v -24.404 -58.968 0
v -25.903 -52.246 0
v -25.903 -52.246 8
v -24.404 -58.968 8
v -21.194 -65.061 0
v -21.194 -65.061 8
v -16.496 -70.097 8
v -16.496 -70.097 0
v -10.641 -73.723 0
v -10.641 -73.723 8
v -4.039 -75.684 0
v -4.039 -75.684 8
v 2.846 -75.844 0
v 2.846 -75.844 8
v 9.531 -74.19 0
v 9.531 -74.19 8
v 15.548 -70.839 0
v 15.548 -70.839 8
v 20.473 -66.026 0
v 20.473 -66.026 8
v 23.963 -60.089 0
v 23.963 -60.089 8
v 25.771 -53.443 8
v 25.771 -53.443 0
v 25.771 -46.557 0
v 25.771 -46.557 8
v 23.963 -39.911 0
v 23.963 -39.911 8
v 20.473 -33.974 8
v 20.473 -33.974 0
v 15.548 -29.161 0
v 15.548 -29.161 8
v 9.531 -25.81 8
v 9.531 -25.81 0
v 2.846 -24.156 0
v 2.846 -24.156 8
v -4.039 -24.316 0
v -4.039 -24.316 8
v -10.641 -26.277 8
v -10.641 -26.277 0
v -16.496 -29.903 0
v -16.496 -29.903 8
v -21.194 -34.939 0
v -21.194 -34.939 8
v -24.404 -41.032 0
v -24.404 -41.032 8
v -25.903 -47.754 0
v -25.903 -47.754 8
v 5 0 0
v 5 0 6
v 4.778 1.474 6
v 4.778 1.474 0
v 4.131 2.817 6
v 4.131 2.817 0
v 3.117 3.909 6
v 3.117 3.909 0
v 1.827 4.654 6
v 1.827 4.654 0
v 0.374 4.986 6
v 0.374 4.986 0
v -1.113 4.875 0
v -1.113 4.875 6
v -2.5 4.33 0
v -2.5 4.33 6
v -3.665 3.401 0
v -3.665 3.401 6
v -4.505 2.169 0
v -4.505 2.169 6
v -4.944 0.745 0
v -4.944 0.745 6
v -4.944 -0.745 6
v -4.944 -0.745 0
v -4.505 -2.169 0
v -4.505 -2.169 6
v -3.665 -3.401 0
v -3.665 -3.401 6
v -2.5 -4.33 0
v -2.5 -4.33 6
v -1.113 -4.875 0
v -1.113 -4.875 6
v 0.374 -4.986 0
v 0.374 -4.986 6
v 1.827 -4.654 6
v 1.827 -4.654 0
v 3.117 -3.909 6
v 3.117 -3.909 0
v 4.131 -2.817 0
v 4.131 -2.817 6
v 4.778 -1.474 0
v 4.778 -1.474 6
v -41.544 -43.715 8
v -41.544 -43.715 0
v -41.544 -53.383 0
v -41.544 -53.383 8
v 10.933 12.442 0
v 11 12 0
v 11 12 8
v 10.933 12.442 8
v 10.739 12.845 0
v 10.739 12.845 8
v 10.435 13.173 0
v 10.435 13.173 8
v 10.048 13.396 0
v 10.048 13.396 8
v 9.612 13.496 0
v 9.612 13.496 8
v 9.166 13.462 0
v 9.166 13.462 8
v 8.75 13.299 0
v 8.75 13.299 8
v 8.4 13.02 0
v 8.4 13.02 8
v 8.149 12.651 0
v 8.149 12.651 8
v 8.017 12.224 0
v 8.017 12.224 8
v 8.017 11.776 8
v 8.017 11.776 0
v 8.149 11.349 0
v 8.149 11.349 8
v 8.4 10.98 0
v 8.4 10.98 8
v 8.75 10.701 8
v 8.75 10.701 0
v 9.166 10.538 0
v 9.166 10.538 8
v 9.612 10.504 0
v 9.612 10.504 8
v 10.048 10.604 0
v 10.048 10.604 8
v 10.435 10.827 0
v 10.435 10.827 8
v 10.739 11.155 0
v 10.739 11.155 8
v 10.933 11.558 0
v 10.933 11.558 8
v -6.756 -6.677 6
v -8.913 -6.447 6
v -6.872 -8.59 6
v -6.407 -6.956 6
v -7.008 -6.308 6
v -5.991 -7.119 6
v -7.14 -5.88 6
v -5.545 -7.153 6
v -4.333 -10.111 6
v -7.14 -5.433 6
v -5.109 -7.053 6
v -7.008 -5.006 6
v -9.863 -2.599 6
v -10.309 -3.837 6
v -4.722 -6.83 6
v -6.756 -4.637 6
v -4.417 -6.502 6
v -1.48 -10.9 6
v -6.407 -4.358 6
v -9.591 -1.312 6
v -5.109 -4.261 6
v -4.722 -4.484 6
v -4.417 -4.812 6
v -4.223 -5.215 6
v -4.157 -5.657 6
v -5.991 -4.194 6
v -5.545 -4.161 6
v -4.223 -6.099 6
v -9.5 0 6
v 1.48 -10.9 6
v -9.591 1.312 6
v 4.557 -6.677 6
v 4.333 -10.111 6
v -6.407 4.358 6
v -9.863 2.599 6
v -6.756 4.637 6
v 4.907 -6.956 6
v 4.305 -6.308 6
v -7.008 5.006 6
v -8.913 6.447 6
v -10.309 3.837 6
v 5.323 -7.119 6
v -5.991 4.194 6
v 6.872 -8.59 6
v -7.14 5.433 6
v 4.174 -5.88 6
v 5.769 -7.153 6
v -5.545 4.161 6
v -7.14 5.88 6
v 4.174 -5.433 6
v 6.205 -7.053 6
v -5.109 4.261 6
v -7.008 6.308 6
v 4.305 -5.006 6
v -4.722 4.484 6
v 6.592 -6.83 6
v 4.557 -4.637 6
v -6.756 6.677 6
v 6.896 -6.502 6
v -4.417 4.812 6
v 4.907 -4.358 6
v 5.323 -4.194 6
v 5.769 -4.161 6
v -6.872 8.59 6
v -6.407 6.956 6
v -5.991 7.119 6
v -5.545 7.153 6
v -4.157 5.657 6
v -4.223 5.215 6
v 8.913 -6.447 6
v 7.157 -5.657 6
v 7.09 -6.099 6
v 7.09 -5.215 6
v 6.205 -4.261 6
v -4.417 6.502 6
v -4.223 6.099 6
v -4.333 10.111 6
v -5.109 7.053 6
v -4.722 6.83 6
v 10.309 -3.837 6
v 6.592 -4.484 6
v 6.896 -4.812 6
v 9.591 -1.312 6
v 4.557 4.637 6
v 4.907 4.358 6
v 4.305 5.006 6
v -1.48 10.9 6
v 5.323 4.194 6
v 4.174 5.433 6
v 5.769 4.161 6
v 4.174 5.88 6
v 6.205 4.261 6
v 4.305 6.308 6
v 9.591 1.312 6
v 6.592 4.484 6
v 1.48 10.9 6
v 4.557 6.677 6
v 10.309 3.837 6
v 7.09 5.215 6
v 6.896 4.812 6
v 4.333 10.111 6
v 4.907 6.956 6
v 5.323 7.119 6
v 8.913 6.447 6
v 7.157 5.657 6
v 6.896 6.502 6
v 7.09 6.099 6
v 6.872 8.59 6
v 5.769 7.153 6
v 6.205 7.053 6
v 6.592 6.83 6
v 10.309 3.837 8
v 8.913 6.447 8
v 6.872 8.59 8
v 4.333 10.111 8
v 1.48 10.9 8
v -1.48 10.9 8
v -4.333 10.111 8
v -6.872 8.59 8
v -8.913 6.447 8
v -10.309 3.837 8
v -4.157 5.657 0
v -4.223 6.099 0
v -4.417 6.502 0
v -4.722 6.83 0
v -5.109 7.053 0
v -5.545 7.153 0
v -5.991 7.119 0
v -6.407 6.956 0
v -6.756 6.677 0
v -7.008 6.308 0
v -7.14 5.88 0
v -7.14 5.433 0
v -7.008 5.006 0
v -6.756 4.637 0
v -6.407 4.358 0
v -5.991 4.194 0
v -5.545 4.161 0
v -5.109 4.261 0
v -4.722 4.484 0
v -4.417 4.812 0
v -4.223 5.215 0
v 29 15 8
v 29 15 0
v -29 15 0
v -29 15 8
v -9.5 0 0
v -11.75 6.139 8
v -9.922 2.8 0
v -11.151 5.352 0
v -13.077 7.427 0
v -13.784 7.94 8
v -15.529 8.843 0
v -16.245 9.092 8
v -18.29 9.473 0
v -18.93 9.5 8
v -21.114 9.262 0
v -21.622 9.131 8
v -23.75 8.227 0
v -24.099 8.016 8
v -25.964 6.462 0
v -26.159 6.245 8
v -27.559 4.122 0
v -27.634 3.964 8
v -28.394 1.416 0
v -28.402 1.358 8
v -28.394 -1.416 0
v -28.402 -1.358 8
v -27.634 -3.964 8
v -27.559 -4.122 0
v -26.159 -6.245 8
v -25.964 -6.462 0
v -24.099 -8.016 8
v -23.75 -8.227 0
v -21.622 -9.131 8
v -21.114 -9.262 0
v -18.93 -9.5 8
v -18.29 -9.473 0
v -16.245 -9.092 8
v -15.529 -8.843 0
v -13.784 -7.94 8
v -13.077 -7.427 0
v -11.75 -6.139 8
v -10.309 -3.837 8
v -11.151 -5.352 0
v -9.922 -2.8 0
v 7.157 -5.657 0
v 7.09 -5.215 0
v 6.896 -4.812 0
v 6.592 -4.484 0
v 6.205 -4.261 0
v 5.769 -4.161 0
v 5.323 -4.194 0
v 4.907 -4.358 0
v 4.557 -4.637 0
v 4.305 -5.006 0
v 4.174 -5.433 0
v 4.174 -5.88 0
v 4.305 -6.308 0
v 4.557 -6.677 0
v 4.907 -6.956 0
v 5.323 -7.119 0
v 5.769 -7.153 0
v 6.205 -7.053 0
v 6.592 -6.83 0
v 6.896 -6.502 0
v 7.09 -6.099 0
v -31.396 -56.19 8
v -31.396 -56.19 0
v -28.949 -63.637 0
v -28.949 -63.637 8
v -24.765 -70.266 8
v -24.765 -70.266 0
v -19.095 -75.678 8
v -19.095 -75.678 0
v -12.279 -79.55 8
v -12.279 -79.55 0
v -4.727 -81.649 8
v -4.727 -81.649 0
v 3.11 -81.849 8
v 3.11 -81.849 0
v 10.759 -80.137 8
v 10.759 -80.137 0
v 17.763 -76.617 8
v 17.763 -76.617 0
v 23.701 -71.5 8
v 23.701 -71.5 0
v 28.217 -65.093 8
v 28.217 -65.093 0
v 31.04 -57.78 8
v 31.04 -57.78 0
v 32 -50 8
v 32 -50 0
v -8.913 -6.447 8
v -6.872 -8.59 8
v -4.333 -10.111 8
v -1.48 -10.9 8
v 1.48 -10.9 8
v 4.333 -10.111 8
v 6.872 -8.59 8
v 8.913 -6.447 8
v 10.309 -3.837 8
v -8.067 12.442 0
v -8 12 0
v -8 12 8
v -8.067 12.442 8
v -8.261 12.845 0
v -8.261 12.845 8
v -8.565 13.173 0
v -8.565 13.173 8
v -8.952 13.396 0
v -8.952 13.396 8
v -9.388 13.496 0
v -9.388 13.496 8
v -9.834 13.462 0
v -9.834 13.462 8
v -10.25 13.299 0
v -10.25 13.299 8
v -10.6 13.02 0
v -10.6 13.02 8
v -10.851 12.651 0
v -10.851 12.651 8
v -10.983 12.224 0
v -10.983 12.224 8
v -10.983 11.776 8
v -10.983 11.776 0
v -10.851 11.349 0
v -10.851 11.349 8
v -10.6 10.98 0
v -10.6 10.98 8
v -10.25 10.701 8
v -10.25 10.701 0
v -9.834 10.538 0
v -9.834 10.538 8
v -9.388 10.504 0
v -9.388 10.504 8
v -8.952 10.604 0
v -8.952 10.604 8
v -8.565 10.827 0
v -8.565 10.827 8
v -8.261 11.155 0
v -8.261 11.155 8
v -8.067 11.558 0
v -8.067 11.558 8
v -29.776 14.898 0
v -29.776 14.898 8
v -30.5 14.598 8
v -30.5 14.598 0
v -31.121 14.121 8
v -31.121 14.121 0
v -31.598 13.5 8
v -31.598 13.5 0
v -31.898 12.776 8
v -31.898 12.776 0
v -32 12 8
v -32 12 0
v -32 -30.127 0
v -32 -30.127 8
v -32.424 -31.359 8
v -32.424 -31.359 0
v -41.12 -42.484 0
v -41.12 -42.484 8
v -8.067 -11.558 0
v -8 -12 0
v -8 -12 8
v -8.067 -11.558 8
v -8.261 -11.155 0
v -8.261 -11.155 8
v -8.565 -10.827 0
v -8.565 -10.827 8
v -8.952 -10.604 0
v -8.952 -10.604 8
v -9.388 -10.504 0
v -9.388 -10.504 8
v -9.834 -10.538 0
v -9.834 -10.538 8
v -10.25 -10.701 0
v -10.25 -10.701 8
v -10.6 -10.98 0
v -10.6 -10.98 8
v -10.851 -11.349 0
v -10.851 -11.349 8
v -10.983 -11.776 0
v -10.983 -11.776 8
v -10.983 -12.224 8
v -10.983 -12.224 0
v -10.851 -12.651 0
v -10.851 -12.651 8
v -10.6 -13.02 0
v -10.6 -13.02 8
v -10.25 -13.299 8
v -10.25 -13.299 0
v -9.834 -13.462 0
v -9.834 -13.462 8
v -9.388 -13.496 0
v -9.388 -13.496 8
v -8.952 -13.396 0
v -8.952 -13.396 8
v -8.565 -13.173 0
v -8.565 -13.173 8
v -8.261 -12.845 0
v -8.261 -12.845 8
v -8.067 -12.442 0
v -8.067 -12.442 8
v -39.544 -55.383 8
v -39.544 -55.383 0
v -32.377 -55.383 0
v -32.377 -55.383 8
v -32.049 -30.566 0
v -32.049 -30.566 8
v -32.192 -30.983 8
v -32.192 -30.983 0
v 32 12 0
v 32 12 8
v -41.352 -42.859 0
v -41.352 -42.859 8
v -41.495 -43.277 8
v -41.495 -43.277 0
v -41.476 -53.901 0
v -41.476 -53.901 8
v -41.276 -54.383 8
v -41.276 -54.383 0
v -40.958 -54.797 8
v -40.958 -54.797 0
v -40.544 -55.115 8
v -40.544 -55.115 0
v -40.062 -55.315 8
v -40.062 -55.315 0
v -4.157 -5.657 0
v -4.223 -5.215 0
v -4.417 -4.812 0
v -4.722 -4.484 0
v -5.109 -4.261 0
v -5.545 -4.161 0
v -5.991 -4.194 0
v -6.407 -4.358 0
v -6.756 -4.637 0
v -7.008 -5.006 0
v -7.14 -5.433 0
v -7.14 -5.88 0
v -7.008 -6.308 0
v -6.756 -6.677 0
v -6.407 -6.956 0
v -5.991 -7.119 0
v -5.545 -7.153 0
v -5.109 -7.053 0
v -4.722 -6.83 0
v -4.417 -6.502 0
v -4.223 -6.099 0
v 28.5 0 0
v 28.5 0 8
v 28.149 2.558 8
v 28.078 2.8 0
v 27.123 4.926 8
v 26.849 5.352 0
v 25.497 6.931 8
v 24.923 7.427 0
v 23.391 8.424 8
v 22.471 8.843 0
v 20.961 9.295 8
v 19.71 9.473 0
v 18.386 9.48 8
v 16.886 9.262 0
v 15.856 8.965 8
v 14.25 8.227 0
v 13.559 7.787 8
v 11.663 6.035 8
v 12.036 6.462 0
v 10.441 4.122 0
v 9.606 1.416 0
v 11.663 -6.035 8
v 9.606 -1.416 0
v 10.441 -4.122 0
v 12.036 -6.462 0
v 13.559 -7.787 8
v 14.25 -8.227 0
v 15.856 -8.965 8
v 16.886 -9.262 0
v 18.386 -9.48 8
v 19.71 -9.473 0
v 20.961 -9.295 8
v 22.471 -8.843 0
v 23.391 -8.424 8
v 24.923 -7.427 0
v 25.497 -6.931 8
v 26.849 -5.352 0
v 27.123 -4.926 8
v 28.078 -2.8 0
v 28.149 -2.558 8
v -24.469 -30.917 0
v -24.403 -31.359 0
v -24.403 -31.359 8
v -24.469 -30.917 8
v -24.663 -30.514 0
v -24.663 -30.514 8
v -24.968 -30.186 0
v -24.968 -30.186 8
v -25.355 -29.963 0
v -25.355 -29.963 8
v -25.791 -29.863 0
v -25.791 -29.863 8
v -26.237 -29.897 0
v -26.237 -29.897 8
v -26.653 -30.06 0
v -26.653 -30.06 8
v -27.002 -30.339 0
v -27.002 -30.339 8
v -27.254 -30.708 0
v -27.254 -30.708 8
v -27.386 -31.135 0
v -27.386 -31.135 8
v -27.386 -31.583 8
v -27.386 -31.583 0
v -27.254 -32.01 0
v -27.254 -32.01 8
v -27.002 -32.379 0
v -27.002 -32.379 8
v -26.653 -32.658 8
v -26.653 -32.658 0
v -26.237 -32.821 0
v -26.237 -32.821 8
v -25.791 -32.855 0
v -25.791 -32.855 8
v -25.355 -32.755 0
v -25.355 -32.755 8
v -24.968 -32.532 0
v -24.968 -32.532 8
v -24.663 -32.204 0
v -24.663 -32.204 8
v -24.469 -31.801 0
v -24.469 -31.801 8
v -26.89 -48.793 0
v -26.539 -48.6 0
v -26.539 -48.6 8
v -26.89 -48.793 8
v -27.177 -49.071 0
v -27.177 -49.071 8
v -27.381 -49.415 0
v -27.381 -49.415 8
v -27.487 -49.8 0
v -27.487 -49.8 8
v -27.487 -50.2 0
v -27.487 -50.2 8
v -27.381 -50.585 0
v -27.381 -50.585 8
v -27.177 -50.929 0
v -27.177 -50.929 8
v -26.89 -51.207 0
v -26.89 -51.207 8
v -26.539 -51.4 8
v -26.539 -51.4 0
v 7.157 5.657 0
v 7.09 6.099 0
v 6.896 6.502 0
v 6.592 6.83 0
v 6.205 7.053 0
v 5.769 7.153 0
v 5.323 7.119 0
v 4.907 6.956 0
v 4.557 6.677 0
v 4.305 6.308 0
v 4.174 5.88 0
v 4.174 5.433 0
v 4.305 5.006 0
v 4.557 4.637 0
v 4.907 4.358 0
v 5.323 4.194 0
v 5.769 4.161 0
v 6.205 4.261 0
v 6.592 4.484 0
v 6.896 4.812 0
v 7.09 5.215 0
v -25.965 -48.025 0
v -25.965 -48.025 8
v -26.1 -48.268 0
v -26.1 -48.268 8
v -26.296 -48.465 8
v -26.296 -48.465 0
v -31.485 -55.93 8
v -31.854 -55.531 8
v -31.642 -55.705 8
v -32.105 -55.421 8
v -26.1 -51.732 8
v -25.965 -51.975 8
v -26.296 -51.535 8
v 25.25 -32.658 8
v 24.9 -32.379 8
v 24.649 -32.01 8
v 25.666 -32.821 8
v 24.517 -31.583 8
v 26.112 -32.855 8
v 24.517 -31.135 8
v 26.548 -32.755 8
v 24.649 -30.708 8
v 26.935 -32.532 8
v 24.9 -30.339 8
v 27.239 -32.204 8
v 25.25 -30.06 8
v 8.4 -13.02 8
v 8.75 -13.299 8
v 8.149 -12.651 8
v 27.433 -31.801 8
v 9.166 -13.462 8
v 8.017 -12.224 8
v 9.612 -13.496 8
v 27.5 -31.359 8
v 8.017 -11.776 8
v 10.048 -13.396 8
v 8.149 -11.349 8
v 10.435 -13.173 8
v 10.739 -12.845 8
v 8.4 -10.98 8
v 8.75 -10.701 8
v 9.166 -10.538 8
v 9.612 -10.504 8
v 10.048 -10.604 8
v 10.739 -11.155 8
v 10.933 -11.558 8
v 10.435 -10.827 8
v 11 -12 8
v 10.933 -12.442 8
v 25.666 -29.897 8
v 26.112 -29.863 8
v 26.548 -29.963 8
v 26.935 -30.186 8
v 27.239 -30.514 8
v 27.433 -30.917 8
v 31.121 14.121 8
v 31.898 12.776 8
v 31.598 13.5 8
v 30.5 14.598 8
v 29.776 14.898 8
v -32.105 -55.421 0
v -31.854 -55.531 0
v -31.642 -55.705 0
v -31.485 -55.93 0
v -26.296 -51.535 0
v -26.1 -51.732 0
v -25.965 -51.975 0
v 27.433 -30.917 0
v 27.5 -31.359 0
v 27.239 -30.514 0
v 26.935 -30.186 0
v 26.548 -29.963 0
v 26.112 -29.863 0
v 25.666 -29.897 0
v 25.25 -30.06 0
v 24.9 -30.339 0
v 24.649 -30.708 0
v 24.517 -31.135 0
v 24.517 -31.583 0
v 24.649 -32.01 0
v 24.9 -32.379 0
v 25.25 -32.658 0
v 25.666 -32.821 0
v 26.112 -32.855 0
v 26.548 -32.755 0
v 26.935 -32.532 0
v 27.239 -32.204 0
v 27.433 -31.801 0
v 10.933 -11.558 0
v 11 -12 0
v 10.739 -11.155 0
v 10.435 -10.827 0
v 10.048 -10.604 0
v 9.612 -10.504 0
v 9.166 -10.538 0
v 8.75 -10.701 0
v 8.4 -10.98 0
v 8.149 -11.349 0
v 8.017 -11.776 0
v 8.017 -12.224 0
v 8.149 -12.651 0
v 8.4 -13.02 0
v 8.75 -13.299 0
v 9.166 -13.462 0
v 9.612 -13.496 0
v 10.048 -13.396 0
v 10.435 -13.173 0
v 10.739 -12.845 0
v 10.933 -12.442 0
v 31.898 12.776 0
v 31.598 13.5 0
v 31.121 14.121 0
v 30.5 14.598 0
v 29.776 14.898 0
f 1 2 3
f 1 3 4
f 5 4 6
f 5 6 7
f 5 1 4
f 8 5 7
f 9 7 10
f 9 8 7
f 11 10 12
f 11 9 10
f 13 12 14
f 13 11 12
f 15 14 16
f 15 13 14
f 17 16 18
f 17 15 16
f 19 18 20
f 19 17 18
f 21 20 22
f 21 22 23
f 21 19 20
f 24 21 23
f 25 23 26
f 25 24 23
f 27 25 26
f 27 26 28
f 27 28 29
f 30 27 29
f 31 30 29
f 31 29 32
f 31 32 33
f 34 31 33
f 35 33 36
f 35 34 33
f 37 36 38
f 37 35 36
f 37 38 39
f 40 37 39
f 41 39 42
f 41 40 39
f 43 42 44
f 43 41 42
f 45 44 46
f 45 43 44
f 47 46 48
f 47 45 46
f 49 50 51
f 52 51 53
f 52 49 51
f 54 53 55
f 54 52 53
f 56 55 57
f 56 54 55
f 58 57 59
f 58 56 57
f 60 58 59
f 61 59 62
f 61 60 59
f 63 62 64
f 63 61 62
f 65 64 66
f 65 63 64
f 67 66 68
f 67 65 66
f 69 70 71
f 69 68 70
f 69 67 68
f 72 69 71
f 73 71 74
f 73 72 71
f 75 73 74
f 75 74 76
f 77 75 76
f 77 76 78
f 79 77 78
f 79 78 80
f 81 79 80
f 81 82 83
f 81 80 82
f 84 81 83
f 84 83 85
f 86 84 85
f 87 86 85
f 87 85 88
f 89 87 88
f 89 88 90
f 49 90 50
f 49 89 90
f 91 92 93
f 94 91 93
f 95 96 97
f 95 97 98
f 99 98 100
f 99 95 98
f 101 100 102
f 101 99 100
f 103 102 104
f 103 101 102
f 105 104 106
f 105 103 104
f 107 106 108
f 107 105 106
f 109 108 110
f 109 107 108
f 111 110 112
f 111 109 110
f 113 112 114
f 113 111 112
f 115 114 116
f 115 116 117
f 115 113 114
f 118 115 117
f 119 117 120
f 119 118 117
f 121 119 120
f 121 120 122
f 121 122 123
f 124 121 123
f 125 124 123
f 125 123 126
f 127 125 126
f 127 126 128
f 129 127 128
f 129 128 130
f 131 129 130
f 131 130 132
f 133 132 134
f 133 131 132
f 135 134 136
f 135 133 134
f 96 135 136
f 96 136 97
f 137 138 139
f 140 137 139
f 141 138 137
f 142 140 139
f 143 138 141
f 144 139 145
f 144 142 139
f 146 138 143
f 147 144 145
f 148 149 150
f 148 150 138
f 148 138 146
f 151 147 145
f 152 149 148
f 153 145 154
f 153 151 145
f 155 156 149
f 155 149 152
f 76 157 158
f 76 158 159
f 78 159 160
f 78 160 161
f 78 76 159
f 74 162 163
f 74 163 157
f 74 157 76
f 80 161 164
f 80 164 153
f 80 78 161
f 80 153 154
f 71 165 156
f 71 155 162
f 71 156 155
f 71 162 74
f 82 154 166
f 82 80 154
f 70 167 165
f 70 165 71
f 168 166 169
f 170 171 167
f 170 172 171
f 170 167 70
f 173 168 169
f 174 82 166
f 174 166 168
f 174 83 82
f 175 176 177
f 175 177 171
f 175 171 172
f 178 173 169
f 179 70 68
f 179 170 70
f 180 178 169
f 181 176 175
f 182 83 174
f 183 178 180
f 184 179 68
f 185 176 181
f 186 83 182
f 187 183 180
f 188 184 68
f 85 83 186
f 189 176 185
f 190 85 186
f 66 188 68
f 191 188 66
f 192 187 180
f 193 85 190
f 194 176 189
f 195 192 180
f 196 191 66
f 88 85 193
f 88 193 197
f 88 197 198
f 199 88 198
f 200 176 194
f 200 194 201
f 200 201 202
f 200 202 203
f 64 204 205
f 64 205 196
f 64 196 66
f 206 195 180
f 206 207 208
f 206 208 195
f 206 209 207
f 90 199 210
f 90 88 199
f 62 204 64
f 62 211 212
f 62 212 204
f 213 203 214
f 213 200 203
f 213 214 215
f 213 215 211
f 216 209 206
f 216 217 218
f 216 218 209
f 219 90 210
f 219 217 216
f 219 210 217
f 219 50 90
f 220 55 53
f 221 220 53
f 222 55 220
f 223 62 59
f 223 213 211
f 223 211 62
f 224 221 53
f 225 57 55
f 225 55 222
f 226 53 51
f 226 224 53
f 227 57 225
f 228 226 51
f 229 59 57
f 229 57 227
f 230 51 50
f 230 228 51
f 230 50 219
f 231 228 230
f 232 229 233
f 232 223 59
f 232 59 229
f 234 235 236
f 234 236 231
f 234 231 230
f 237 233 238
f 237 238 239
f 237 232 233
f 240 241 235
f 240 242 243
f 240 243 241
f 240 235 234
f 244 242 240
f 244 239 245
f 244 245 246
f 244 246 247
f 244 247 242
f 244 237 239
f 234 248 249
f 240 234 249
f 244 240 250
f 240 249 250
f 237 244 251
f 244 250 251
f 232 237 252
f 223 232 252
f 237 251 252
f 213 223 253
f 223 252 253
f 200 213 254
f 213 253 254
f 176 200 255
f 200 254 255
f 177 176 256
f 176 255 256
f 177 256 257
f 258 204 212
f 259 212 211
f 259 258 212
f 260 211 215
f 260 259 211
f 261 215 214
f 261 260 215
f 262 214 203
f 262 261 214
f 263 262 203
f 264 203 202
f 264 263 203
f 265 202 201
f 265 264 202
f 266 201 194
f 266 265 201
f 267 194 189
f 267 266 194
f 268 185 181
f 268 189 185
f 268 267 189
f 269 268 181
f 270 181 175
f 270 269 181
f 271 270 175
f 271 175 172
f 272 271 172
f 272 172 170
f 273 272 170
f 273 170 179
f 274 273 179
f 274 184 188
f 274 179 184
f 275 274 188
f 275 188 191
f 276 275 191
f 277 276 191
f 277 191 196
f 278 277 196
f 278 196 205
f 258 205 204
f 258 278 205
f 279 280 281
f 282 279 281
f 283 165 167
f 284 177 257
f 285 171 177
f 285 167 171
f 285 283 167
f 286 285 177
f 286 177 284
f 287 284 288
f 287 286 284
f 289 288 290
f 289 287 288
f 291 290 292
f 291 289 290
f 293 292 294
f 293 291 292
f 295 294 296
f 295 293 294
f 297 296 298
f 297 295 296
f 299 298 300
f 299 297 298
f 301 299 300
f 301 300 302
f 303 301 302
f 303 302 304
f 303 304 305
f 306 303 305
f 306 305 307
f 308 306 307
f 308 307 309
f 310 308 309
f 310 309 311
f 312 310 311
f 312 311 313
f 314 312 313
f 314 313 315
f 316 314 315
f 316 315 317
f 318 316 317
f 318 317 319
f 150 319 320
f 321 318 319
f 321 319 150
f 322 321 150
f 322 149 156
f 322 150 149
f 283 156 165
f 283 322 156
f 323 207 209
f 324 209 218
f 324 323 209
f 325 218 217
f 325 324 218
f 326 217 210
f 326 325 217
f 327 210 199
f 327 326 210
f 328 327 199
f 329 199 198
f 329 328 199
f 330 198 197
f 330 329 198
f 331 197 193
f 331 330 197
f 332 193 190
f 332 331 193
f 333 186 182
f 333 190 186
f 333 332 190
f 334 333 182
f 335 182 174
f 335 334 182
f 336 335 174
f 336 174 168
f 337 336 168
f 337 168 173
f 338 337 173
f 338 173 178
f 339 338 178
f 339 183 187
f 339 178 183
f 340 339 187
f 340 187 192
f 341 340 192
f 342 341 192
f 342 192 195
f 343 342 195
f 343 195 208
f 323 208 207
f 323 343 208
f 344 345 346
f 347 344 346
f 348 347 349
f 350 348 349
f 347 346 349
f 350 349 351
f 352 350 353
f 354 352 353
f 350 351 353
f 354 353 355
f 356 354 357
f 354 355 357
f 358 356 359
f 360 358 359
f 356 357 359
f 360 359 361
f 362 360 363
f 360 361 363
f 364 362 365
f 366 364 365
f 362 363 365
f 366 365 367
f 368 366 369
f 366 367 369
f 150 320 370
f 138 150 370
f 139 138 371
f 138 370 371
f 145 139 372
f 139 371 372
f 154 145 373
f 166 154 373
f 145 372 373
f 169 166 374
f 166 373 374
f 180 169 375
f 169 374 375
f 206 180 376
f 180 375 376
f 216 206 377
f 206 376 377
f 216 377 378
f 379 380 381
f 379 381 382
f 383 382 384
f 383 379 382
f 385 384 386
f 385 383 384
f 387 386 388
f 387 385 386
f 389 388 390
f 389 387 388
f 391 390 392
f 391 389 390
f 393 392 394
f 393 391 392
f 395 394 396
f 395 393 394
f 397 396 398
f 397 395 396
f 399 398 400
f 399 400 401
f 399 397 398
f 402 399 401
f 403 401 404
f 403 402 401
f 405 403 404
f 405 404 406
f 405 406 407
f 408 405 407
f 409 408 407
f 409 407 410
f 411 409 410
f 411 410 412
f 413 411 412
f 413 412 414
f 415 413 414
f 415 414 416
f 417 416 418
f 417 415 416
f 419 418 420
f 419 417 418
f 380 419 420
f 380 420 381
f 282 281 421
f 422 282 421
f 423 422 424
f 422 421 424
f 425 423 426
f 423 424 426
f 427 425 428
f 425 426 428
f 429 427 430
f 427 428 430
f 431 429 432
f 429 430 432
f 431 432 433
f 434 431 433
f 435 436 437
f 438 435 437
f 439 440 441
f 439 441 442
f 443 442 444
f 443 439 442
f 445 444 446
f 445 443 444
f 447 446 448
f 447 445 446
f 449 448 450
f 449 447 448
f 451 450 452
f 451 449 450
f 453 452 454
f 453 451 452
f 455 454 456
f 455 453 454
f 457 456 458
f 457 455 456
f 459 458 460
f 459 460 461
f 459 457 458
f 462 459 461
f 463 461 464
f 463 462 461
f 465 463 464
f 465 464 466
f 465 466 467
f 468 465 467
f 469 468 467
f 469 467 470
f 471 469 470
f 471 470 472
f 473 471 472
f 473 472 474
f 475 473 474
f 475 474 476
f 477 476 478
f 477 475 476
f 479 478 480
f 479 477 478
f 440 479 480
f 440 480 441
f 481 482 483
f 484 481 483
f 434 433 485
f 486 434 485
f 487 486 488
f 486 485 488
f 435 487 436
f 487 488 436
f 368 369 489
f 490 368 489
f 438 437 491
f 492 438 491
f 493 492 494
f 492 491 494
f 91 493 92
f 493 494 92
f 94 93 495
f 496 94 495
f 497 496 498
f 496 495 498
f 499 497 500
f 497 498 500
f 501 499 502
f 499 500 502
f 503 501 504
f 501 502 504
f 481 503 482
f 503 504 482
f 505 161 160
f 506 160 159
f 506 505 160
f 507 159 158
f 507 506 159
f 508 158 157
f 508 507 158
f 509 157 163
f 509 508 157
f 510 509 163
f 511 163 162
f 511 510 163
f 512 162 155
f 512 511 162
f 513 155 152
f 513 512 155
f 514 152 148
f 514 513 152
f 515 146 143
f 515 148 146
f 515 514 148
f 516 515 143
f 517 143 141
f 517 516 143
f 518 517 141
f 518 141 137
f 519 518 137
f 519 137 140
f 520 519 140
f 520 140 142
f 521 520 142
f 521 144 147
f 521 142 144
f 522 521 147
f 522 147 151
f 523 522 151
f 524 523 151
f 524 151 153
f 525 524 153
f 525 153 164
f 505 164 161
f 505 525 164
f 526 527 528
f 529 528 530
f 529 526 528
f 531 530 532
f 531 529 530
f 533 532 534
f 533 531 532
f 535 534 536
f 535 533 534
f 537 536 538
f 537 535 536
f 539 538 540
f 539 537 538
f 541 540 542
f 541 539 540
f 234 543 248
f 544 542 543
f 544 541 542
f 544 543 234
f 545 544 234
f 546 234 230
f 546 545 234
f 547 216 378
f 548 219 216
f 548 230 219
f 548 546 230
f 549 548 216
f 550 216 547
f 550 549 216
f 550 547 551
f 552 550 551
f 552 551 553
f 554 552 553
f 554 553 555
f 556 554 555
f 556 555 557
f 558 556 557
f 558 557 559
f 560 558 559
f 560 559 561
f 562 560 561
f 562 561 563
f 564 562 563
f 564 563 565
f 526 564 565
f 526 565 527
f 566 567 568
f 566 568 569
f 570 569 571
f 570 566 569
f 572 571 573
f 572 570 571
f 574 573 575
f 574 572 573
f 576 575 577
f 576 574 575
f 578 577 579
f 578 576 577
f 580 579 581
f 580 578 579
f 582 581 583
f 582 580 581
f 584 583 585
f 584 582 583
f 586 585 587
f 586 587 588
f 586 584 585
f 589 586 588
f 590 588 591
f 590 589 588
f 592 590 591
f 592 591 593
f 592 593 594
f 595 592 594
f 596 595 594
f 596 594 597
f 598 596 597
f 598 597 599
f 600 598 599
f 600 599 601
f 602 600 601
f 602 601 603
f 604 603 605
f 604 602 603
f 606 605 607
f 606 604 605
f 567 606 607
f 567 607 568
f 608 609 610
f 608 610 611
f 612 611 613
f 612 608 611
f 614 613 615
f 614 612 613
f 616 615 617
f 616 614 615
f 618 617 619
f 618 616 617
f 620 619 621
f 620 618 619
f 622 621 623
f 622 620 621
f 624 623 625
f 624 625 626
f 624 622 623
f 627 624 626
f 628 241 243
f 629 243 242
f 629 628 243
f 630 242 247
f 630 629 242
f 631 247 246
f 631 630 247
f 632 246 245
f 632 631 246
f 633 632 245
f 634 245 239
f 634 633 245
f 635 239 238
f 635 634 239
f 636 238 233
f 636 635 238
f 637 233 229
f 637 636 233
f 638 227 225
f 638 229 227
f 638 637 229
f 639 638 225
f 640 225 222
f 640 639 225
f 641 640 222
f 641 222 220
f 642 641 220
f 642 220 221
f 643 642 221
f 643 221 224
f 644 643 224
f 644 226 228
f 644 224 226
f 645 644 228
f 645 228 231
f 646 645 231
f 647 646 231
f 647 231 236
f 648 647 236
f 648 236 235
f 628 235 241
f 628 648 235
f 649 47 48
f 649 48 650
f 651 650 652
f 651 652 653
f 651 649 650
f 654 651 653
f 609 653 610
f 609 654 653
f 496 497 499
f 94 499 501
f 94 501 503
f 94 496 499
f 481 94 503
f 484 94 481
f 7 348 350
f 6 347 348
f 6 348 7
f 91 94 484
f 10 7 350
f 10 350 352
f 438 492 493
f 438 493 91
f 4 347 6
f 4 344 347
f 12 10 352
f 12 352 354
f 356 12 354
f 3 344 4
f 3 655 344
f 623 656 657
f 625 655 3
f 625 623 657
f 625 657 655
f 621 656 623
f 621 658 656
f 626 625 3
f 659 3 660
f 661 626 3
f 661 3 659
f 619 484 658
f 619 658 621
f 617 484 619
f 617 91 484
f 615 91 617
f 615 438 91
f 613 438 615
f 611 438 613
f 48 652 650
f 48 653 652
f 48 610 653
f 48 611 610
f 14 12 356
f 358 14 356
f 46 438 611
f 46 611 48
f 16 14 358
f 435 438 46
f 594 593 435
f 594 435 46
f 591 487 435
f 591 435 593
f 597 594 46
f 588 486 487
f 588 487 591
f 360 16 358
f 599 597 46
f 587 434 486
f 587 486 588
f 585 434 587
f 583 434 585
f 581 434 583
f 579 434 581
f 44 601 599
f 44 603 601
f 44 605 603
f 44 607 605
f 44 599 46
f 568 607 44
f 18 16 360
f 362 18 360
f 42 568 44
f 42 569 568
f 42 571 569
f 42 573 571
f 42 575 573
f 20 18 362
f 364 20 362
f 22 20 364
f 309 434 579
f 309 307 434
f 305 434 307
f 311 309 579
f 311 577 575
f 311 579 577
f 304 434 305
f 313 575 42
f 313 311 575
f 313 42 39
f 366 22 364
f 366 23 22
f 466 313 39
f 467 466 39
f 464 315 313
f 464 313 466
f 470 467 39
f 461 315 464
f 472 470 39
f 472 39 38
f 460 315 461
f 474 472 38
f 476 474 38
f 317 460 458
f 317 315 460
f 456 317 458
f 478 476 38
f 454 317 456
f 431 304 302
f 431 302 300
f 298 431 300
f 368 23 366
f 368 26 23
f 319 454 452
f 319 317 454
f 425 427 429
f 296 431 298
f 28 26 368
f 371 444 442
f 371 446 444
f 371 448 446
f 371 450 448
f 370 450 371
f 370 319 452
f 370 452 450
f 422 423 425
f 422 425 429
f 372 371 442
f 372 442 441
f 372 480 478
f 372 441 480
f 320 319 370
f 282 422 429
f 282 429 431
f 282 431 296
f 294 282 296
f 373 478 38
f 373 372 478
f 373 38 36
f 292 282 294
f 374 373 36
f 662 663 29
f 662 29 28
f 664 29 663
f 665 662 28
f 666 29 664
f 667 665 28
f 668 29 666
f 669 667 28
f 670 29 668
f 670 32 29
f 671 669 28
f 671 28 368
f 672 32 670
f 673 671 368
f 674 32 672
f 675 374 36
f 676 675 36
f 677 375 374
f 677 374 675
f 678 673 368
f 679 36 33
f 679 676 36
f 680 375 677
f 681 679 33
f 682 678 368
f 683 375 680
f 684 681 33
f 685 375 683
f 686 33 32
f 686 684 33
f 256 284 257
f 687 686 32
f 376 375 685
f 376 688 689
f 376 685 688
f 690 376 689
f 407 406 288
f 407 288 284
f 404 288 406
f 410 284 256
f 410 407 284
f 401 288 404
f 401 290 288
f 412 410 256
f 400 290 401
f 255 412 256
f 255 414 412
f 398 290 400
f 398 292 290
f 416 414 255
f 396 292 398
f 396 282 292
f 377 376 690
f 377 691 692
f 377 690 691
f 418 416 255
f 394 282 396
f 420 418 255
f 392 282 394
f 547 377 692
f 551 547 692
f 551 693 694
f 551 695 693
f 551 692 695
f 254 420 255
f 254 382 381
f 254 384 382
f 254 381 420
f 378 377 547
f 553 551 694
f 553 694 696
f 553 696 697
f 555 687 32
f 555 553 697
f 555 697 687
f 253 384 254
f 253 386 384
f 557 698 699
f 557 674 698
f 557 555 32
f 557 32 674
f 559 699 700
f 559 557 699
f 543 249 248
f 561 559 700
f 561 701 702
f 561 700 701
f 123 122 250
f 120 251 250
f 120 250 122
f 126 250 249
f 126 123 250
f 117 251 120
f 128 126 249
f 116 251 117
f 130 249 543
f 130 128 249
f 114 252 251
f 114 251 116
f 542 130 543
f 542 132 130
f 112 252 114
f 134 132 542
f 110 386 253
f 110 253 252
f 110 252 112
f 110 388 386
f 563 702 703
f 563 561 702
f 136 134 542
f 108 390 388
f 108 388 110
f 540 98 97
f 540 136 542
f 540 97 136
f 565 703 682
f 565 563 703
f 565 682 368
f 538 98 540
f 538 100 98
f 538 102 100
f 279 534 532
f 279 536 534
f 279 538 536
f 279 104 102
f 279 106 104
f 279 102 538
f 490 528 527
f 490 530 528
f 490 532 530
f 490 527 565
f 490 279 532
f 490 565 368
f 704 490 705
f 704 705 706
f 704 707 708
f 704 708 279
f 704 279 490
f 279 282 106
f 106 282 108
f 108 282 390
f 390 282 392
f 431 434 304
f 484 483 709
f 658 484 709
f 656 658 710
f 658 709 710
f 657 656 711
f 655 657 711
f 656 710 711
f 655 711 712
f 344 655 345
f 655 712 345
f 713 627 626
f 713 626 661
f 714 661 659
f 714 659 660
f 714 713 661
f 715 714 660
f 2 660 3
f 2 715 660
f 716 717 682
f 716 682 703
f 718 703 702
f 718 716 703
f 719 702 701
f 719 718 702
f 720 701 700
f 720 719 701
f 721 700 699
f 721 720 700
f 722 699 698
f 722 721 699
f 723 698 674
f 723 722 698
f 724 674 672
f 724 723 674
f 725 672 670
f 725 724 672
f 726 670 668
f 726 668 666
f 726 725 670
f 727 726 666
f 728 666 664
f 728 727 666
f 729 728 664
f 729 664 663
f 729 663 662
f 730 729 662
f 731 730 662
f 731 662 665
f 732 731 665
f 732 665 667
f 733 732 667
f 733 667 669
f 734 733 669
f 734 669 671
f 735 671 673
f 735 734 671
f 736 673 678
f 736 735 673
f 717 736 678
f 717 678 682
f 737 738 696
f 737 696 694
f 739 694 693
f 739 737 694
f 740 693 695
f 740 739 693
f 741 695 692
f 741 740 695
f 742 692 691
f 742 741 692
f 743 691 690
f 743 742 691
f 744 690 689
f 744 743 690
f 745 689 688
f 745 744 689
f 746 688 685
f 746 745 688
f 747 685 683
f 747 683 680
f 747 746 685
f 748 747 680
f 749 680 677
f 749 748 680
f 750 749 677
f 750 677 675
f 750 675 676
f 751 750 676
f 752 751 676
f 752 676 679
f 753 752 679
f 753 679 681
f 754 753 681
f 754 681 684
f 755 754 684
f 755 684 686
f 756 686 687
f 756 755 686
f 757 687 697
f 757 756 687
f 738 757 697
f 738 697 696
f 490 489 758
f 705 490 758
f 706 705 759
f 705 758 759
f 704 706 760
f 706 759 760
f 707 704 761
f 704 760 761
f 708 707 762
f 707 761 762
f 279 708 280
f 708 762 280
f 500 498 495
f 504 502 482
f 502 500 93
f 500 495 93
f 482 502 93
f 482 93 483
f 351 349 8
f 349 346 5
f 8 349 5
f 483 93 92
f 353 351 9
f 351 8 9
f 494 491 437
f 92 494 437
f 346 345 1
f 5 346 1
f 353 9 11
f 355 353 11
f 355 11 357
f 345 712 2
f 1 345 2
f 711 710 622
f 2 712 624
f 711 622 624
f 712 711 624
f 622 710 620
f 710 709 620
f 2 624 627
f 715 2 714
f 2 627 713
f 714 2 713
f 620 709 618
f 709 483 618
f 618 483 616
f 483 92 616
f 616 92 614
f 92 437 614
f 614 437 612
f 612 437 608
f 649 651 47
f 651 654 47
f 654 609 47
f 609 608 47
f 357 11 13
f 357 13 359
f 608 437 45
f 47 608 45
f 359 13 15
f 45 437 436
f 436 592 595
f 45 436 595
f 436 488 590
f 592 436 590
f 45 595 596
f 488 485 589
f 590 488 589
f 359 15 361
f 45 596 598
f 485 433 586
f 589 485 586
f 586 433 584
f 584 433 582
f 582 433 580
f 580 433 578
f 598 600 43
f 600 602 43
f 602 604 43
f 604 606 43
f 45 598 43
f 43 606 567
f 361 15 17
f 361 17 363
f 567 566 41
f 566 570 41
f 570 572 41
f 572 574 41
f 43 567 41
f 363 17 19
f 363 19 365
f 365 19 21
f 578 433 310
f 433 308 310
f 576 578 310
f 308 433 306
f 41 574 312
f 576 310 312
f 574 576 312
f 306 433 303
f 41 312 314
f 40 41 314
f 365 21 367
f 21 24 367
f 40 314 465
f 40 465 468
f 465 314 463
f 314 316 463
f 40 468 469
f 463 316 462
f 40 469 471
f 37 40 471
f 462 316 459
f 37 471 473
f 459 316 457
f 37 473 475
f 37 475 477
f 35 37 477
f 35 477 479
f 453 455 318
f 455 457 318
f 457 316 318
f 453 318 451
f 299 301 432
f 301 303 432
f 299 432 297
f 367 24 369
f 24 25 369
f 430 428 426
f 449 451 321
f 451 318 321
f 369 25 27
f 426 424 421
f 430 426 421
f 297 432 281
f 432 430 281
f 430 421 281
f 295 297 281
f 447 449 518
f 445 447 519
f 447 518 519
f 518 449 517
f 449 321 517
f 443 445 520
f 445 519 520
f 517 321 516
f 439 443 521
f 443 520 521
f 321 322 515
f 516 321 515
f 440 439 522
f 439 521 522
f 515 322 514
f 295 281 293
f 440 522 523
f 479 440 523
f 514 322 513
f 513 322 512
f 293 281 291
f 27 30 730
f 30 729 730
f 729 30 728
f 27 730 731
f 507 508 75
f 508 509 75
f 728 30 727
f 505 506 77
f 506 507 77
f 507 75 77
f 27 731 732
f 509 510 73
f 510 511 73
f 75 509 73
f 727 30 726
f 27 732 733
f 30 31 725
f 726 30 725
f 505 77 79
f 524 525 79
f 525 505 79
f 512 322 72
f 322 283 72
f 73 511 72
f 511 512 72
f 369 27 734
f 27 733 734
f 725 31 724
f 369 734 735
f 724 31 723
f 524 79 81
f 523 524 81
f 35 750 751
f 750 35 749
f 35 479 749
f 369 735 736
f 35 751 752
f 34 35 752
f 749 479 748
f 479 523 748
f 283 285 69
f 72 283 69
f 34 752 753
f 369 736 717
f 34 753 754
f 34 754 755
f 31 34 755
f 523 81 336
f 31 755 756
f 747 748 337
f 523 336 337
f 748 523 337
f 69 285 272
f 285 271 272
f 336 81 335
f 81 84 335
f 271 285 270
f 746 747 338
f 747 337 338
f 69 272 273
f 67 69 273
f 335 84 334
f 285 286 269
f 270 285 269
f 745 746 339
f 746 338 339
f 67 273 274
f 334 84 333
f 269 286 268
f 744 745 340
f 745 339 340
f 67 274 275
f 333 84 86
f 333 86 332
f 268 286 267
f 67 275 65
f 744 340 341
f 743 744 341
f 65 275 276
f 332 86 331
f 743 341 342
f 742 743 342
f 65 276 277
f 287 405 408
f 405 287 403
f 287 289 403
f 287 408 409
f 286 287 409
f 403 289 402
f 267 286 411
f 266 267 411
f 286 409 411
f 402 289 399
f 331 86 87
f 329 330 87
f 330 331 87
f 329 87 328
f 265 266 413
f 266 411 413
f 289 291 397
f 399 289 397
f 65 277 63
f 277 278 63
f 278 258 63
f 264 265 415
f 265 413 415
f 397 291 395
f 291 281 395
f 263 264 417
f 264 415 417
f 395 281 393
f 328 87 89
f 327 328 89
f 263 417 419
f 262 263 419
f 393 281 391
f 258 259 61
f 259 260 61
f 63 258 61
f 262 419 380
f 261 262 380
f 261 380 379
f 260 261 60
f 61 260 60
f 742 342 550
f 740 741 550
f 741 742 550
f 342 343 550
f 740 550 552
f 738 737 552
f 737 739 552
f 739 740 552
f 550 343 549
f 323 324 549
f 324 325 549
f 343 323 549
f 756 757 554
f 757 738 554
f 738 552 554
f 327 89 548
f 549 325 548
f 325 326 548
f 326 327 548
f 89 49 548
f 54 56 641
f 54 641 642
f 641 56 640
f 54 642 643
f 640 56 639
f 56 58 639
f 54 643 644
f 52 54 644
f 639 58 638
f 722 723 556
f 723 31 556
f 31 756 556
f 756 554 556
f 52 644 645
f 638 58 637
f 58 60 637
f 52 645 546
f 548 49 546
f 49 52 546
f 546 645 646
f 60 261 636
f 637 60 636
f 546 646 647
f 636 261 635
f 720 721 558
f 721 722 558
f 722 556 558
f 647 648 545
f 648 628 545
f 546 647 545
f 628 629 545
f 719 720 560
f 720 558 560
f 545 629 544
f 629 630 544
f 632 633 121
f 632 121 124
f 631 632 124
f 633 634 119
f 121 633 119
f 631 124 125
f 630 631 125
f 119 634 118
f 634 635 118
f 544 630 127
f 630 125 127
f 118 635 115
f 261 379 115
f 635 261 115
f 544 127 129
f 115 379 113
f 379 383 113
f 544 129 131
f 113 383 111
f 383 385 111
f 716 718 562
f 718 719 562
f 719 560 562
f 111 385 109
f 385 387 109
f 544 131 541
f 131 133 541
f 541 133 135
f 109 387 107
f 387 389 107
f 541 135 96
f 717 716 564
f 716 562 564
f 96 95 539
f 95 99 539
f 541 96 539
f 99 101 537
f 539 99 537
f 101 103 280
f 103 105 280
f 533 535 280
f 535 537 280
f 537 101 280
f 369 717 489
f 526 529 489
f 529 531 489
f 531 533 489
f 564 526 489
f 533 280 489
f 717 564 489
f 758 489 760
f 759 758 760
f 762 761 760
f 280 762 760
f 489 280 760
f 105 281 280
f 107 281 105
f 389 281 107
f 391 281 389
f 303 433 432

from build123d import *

# Parameters (mm, degrees)
SKETCH_1_R          = 5
SKETCH_1_R_2        = 9.5
SKETCH_1_R_3        = 1.5
EXTRUDE_1_DEPTH     = 8
SKETCH_2_R          = 11
CUT_EXTRUDE_1_DEPTH = 2


with BuildPart() as part:
    # Эскиз1 → Бобышка-Вытянуть1 (new body)
    with BuildSketch(Plane.XY):
        with BuildLine():
            Line((32, -50), (32, -17))
            Line((32, -17), (32, 12))
            ThreePointArc((32, 12), (31.121320344, 14.121320344), (29, 15))
            Line((29, 15), (-29, 15))
            ThreePointArc((-29, 15), (-31.121320344, 14.121320344), (-32, 12))
            Line((-32, 12), (-32, -17))
            Line((-32, -17), (-32, -30.127300246))
            ThreePointArc((-32, -30.127300246), (-32.109032978, -30.77864019), (-32.424243723, -31.358962601))
            Line((-32.424243723, -31.358962601), (-41.119742613, -42.483754153))
            ThreePointArc((-41.119742613, -42.483754153), (-41.434953358, -43.064076563), (-41.543986336, -43.715416508))
            Line((-41.543986336, -43.715416508), (-41.543986336, -52.683803611))
            Line((-41.543986336, -52.683803611), (-41.543986336, -53.383022016))
            ThreePointArc((-41.543986336, -53.383022016), (-40.958199899, -54.797235578), (-39.543986336, -55.383022016))
            Line((-39.543986336, -55.383022016), (-32.37679771, -55.383022016))
            ThreePointArc((-32.37679771, -55.383022016), (-31.741748464, -55.610550363), (-31.395682628, -56.189597106))
            ThreePointArc((-31.395682628, -56.189597106), (3.109514103, -81.848562323), (32, -50))
        make_face()
        Circle(SKETCH_1_R, mode=Mode.SUBTRACT)
        with Locations((-19, 0)):
            Circle(SKETCH_1_R_2, mode=Mode.SUBTRACT)
        with Locations((19, 0)):
            Circle(SKETCH_1_R_2, mode=Mode.SUBTRACT)
        with Locations((-5.656854249, 5.656854249)):
            Circle(SKETCH_1_R_3, mode=Mode.SUBTRACT)
        with Locations((5.656854249, 5.656854249)):
            Circle(SKETCH_1_R_3, mode=Mode.SUBTRACT)
        with Locations((5.656854249, -5.656854249)):
            Circle(SKETCH_1_R_3, mode=Mode.SUBTRACT)
        with Locations((-5.656854249, -5.656854249)):
            Circle(SKETCH_1_R_3, mode=Mode.SUBTRACT)
        with Locations((-9.5, 12)):
            Circle(SKETCH_1_R_3, mode=Mode.SUBTRACT)
        with Locations((9.5, 12)):
            Circle(SKETCH_1_R_3, mode=Mode.SUBTRACT)
        with Locations((9.5, -12)):
            Circle(SKETCH_1_R_3, mode=Mode.SUBTRACT)
        with Locations((-9.5, -12)):
            Circle(SKETCH_1_R_3, mode=Mode.SUBTRACT)
        with Locations((-25.902777778, -31.358962601)):
            Circle(SKETCH_1_R_3, mode=Mode.SUBTRACT)
        with Locations((26, -31.358962601)):
            Circle(SKETCH_1_R_3, mode=Mode.SUBTRACT)
        with BuildLine():
            ThreePointArc((-25.902777778, -52.246353355), (26, -50), (-25.902777778, -47.753646645))
            ThreePointArc((-25.902777778, -47.753646645), (-26.099772408, -48.268225789), (-26.539423077, -48.600349063))
            ThreePointArc((-26.539423077, -48.600349063), (-27.5, -50), (-26.539423077, -51.399650937))
            ThreePointArc((-26.539423077, -51.399650937), (-26.099772408, -51.731774211), (-25.902777778, -52.246353355))
        make_face(mode=Mode.SUBTRACT)
    extrude(amount=EXTRUDE_1_DEPTH)

    # Эскиз2 → Вырез-Вытянуть1 (cut)
    with BuildSketch(Plane.XY.offset(8)):
        Circle(SKETCH_2_R)
    extrude(amount=-CUT_EXTRUDE_1_DEPTH, mode=Mode.SUBTRACT)


solid = part.part
